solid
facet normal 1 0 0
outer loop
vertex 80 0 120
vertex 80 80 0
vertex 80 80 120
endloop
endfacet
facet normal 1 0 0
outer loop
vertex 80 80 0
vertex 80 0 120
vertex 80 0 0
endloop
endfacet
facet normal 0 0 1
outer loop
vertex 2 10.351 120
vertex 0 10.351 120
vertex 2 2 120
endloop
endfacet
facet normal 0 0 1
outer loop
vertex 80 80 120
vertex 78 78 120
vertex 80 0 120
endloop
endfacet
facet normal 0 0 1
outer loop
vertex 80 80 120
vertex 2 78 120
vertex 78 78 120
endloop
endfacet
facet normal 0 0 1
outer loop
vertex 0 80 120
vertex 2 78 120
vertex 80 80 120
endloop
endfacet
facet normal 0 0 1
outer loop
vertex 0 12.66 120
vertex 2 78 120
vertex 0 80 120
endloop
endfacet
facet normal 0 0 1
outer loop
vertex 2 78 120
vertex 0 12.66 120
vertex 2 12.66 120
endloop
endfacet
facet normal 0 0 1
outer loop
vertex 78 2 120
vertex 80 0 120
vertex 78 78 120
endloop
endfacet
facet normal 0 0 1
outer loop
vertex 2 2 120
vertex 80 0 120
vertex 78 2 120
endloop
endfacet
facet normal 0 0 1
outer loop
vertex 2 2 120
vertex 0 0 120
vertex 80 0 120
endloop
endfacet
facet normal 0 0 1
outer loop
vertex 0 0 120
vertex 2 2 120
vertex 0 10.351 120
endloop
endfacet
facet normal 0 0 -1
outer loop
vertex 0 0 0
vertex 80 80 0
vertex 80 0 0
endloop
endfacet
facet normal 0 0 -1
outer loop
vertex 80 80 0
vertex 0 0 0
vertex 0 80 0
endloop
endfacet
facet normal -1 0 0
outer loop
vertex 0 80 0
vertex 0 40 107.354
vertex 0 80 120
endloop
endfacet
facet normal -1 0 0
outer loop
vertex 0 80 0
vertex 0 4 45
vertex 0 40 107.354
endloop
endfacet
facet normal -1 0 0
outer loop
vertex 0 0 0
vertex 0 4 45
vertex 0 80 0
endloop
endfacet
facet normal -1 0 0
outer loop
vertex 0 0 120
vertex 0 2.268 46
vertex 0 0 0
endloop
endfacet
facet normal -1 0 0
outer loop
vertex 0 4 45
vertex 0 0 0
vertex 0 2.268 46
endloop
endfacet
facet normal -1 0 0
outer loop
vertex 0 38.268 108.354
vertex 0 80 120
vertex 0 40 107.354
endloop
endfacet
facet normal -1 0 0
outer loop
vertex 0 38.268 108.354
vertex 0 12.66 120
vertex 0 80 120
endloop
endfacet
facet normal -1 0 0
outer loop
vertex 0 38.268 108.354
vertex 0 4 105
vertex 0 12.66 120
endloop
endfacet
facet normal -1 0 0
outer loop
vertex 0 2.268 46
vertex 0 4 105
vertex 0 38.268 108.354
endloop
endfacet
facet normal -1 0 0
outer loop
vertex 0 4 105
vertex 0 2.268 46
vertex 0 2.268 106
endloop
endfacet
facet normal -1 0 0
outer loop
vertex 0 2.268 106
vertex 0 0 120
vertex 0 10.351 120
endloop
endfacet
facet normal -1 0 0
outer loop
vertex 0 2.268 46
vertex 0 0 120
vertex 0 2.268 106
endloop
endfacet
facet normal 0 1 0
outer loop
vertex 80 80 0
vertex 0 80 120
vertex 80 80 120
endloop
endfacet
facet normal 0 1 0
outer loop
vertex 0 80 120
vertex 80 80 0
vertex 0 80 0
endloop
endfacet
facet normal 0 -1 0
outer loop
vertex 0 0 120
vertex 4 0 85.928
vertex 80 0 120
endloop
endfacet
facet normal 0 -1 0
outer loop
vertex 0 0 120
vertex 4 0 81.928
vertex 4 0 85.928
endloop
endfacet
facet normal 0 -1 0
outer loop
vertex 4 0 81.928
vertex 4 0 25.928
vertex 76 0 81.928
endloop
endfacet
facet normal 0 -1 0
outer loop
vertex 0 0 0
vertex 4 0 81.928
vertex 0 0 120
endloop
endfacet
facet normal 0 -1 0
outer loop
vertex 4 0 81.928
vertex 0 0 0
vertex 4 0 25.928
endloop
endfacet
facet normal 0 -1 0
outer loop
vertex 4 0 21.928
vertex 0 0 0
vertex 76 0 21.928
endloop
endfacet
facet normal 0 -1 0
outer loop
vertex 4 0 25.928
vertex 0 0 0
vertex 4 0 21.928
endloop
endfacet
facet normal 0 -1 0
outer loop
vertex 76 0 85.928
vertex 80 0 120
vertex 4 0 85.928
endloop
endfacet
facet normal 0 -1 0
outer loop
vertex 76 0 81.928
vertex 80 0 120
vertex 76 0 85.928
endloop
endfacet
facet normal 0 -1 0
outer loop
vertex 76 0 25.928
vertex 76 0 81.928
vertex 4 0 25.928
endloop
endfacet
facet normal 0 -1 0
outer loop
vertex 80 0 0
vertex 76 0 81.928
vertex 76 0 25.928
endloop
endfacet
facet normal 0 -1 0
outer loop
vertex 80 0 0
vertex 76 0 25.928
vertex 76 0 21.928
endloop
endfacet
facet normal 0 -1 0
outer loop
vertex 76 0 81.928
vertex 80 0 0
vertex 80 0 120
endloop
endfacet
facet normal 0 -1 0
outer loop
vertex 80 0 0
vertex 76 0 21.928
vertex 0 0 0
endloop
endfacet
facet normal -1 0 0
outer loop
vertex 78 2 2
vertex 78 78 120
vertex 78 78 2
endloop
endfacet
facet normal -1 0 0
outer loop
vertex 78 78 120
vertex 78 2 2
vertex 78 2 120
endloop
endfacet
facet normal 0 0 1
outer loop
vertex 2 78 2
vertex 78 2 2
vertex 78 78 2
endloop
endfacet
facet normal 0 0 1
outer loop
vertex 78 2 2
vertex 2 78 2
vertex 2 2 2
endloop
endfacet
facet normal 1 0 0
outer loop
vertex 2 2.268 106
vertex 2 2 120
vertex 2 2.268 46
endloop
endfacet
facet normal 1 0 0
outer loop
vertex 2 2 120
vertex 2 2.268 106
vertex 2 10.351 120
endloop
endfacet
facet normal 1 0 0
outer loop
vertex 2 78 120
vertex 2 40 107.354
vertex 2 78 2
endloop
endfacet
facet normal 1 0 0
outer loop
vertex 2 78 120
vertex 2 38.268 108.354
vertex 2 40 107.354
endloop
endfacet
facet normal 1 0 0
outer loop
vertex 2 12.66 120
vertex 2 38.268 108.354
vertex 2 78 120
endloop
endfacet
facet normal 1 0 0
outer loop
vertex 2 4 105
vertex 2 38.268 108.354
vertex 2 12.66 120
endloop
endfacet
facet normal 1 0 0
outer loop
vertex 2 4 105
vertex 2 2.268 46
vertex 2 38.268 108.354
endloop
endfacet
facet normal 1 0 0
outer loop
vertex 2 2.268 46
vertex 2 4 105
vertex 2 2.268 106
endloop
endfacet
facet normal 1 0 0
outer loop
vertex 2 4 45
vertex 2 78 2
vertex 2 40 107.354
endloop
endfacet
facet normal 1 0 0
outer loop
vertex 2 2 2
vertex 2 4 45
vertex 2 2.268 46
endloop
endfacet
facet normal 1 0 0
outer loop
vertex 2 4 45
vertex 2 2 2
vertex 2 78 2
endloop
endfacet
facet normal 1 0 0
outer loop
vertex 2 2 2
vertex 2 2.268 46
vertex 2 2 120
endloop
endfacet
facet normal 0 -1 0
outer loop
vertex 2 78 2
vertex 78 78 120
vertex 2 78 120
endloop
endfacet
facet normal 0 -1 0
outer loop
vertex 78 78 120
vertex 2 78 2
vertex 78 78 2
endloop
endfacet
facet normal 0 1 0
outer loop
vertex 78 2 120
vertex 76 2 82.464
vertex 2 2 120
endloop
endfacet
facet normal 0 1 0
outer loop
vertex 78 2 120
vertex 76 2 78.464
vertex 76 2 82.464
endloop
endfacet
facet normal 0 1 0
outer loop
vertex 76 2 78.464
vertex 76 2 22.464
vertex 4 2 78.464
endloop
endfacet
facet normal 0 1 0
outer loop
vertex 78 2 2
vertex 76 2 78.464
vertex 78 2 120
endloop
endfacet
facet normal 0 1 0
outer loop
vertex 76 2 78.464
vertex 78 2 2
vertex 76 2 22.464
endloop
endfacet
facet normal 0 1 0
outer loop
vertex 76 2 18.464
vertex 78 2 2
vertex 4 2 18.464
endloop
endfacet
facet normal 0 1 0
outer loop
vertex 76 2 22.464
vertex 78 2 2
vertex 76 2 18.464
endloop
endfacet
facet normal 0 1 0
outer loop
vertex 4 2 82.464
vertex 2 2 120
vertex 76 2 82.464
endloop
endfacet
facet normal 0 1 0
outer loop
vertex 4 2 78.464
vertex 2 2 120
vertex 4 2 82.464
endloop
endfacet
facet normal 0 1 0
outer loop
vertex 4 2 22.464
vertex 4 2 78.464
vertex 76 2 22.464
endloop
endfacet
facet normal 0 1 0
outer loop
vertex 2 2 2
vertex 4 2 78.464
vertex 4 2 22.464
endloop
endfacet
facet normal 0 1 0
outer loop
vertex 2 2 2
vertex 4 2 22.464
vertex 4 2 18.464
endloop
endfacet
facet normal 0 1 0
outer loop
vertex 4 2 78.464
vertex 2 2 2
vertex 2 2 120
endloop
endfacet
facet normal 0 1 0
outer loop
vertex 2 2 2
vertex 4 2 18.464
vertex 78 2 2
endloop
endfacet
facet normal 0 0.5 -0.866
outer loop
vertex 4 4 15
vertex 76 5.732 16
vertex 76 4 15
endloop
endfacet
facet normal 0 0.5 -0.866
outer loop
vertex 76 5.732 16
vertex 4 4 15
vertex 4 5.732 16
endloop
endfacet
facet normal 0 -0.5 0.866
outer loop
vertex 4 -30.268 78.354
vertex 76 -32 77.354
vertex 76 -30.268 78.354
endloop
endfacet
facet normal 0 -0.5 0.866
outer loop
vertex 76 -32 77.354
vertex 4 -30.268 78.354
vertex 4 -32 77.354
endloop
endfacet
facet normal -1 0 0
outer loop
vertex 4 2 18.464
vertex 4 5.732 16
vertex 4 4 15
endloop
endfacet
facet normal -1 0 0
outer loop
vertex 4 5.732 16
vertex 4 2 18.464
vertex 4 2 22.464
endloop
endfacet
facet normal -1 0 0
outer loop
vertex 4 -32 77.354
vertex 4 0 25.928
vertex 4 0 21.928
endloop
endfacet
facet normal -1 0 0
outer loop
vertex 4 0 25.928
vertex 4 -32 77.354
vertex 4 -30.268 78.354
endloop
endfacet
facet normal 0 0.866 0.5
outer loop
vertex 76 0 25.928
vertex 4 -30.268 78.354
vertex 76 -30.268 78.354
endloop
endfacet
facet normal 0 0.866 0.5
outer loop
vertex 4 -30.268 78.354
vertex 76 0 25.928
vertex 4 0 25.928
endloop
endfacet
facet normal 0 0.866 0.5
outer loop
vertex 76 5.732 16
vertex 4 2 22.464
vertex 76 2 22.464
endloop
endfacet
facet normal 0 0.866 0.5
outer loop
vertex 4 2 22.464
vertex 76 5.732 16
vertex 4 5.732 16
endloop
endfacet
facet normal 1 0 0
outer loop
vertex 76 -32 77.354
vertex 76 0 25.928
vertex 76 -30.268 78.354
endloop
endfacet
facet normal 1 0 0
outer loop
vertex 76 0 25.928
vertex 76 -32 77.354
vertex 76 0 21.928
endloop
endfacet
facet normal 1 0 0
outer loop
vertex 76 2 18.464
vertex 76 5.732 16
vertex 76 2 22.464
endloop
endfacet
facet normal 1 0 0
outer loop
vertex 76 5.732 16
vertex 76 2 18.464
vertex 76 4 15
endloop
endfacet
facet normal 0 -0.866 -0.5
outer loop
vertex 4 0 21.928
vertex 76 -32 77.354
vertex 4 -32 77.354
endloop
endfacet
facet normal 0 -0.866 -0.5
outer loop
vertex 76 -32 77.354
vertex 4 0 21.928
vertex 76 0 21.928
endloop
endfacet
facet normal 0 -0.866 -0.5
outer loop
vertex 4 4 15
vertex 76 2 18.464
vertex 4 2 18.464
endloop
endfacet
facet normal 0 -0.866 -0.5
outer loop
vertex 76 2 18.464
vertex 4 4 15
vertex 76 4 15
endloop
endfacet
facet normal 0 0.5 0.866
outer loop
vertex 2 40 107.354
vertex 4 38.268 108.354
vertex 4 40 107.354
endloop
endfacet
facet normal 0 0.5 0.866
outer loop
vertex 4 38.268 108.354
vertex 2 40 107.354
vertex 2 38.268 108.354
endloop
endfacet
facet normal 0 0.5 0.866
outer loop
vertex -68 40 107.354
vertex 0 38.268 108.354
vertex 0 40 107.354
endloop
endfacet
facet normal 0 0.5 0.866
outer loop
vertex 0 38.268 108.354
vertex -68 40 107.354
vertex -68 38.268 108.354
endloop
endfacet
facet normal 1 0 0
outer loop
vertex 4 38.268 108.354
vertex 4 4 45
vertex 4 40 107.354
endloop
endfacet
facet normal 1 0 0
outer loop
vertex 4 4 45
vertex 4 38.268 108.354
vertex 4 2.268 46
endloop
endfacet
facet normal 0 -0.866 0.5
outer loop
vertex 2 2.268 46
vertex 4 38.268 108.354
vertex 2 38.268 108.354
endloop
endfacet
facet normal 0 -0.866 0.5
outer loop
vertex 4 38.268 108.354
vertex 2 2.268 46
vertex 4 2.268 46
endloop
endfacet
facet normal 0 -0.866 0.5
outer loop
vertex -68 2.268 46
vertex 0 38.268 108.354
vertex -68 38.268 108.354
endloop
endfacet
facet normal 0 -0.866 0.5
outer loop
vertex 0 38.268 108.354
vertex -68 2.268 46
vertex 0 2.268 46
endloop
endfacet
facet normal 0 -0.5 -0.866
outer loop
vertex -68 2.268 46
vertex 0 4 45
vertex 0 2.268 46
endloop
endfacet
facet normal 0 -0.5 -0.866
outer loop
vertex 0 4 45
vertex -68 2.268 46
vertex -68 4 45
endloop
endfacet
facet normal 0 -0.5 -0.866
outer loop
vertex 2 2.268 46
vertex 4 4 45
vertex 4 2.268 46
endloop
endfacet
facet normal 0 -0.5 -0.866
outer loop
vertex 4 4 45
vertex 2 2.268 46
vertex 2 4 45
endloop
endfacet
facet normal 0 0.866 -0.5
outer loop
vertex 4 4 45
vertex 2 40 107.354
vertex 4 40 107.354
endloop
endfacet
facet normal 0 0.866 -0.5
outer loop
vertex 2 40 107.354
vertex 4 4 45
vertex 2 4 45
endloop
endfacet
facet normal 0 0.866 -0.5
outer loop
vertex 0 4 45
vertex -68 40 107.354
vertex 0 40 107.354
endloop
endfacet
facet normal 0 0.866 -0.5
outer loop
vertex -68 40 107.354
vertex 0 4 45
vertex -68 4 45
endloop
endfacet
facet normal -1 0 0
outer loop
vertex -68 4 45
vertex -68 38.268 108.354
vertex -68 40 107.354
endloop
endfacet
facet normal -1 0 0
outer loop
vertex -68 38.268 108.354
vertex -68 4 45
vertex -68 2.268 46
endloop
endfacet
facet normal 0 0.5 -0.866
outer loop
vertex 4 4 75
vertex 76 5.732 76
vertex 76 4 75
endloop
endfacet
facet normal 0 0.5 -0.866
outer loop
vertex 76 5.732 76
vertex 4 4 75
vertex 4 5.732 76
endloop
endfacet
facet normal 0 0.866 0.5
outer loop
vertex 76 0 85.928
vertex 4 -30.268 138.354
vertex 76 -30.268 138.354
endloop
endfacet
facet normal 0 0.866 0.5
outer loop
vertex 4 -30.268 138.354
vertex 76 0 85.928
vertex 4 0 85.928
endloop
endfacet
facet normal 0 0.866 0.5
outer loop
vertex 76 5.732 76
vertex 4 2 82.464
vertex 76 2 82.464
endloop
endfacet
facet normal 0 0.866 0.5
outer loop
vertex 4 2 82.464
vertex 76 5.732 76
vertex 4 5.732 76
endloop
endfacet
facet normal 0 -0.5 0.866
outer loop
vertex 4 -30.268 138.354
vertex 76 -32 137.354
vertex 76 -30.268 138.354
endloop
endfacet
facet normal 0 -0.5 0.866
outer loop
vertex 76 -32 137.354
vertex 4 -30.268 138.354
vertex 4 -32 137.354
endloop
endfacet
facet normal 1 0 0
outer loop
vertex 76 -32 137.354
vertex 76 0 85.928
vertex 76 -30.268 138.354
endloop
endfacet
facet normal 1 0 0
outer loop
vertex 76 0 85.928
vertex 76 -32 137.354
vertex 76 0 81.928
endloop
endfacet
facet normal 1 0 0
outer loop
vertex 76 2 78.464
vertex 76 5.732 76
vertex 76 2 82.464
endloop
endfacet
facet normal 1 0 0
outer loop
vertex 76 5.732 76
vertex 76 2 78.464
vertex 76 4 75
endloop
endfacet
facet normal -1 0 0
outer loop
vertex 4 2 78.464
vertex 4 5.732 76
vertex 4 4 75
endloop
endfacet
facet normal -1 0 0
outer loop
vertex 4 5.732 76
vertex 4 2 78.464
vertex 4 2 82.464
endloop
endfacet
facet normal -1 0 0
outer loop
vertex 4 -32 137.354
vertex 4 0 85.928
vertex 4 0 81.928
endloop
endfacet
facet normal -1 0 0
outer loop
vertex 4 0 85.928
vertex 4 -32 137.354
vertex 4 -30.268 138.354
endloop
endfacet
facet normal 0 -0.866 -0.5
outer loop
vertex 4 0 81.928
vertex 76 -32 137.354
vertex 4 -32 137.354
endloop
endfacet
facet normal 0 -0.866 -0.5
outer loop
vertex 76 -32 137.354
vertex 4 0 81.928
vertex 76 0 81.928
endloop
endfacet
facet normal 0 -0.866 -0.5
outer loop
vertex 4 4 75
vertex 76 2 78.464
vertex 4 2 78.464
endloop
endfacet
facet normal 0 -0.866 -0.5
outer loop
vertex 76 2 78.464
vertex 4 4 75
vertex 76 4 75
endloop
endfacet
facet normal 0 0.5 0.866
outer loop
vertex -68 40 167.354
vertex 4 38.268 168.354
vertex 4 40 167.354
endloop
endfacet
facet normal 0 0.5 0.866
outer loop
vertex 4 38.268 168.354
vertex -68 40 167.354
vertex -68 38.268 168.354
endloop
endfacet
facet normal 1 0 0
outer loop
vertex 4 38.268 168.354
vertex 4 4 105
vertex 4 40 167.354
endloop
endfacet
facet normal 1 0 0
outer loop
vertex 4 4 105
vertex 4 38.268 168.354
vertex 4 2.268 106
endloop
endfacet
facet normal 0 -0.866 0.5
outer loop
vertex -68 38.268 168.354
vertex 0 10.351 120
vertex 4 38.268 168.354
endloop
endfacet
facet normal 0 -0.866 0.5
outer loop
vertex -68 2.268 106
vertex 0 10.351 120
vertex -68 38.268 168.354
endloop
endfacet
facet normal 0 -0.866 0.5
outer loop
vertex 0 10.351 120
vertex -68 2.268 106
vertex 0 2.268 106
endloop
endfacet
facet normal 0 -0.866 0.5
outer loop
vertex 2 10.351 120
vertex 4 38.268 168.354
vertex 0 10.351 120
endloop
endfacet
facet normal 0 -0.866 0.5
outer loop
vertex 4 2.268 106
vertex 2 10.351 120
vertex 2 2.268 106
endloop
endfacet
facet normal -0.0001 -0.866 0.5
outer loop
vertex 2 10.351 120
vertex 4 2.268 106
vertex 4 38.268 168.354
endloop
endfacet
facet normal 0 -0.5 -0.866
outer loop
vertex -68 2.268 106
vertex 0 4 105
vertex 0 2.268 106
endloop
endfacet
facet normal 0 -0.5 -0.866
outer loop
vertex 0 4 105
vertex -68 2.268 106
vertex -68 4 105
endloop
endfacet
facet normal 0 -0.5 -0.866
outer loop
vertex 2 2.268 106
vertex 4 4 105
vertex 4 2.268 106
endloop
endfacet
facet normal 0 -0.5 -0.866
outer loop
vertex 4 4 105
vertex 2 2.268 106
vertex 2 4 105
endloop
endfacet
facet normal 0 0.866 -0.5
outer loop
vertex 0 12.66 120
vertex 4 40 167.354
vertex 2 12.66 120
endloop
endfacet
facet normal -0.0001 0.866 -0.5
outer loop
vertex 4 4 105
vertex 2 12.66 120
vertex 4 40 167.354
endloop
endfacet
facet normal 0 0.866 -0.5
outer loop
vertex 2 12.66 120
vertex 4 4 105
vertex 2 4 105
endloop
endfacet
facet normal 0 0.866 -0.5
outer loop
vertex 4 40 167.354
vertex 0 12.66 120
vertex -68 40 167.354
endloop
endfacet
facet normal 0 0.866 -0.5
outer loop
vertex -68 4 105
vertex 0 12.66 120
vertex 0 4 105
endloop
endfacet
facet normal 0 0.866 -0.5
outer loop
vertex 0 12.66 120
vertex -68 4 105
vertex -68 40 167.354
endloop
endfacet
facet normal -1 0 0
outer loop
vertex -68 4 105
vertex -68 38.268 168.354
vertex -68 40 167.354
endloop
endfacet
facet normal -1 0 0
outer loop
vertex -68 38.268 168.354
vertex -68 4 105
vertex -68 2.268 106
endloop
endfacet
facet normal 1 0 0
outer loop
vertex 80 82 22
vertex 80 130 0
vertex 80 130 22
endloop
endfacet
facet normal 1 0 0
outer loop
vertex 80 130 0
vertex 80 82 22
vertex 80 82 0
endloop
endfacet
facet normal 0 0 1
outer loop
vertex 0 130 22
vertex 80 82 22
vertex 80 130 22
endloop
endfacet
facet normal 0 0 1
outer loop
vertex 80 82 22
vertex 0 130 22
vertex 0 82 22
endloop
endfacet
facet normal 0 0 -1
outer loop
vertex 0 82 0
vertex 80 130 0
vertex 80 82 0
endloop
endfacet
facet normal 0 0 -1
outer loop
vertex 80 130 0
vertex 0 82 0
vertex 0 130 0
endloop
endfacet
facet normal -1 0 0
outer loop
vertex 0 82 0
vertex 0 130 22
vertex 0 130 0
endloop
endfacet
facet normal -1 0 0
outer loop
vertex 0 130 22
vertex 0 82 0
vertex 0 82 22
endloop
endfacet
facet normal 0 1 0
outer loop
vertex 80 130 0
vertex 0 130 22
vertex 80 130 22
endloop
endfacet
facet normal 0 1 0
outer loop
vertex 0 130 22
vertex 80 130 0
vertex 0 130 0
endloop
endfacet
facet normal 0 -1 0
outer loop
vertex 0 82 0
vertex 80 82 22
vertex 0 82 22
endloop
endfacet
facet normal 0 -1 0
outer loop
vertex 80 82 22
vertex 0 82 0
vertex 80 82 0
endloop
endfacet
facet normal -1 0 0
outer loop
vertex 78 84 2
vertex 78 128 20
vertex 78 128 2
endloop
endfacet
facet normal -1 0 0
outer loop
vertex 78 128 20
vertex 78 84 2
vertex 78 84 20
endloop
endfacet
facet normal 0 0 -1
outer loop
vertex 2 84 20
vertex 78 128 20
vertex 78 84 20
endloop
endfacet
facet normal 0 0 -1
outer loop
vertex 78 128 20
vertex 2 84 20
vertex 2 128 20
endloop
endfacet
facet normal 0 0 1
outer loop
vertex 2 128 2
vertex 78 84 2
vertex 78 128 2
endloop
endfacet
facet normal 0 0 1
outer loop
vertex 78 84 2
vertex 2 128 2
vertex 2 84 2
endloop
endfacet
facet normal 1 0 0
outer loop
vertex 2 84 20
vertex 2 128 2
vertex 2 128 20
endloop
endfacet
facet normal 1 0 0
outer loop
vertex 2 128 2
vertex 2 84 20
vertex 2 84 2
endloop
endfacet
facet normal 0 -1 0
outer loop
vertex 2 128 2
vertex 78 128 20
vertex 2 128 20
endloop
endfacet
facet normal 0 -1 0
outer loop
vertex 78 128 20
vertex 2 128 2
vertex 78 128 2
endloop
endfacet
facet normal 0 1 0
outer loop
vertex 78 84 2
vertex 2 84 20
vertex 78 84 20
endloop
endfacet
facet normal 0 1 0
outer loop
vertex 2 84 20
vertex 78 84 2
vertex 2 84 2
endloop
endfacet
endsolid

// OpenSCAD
// ============================================================================
// Tabletop Dice Tower
// Purpose: Multi-ramp randomizer with optional tray.
// Units: millimetres (mm)
// ============================================================================

/* ----------------------------- USER PARAMETERS -------------------------------- */
tower_height = 120;       // tower height (mm)
base_width = 80;          // base width (mm)
ramp_angle = 30;          // ramp angle (degrees)
levels = 4;               // number of levels
wall_thickness = 2;       // wall thickness (mm)
include_tray = true;      // include dice collection tray
clearance = 0.3;          // fit tolerance

/* ------------------------- Assertions & Limits ---------------------------- */
assert(tower_height > 0 && base_width > 0, "tower/base > 0");
assert(levels >= 2, "At least two levels");
assert(ramp_angle >= 10 && ramp_angle <= 70, "ramp angle reasonable");

/* ------------------------- Derived Measurements --------------------------- */
inner_width = base_width - 2*wall_thickness;
level_step = tower_height / levels;

/* ------------------------------ Modules ---------------------------------- */
module dice_tower() {
  // Tower shell
  difference() {
    cube([base_width, base_width, tower_height], center=false);
    if (wall_thickness > 0) {
      translate([wall_thickness, wall_thickness, wall_thickness])
        cube([inner_width, inner_width, tower_height - wall_thickness], center=false);
    }
  }

  // Ramps (simple planes)
  for (i = [0:levels-1]) {
    z = (i+0.5) * level_step;
    translate([wall_thickness + 2, wall_thickness + 2, z])
      rotate([ramp_angle, 0, (i%2==0) ? 0 : 180])
      cube([inner_width - 4, 2, inner_width - 4], center=false);
  }

  // Output tray
  if (include_tray) {
    translate([0, base_width + 2, 0])
      difference() {
        cube([base_width, base_width * 0.6, 22], center=false);
        translate([wall_thickness, wall_thickness, 2])
          cube([base_width - 2*wall_thickness, base_width * 0.6 - 2*wall_thickness, 18], center=false);
      }
  }
}

/* --------------------------------- Call ---------------------------------- */
dice_tower();

/* ============================== HOW TO PRINT / ORIENT ============================== */
// Print orientation: Base down on build plate
// Supports: Yes, needed for ramp overhangs
// Layer height: 0.2mm for good detail
// Infill: 20-25% for gaming durability
// Print speed: Normal (50mm/s)
// Post-processing: Remove supports carefully, test dice flow through tower
